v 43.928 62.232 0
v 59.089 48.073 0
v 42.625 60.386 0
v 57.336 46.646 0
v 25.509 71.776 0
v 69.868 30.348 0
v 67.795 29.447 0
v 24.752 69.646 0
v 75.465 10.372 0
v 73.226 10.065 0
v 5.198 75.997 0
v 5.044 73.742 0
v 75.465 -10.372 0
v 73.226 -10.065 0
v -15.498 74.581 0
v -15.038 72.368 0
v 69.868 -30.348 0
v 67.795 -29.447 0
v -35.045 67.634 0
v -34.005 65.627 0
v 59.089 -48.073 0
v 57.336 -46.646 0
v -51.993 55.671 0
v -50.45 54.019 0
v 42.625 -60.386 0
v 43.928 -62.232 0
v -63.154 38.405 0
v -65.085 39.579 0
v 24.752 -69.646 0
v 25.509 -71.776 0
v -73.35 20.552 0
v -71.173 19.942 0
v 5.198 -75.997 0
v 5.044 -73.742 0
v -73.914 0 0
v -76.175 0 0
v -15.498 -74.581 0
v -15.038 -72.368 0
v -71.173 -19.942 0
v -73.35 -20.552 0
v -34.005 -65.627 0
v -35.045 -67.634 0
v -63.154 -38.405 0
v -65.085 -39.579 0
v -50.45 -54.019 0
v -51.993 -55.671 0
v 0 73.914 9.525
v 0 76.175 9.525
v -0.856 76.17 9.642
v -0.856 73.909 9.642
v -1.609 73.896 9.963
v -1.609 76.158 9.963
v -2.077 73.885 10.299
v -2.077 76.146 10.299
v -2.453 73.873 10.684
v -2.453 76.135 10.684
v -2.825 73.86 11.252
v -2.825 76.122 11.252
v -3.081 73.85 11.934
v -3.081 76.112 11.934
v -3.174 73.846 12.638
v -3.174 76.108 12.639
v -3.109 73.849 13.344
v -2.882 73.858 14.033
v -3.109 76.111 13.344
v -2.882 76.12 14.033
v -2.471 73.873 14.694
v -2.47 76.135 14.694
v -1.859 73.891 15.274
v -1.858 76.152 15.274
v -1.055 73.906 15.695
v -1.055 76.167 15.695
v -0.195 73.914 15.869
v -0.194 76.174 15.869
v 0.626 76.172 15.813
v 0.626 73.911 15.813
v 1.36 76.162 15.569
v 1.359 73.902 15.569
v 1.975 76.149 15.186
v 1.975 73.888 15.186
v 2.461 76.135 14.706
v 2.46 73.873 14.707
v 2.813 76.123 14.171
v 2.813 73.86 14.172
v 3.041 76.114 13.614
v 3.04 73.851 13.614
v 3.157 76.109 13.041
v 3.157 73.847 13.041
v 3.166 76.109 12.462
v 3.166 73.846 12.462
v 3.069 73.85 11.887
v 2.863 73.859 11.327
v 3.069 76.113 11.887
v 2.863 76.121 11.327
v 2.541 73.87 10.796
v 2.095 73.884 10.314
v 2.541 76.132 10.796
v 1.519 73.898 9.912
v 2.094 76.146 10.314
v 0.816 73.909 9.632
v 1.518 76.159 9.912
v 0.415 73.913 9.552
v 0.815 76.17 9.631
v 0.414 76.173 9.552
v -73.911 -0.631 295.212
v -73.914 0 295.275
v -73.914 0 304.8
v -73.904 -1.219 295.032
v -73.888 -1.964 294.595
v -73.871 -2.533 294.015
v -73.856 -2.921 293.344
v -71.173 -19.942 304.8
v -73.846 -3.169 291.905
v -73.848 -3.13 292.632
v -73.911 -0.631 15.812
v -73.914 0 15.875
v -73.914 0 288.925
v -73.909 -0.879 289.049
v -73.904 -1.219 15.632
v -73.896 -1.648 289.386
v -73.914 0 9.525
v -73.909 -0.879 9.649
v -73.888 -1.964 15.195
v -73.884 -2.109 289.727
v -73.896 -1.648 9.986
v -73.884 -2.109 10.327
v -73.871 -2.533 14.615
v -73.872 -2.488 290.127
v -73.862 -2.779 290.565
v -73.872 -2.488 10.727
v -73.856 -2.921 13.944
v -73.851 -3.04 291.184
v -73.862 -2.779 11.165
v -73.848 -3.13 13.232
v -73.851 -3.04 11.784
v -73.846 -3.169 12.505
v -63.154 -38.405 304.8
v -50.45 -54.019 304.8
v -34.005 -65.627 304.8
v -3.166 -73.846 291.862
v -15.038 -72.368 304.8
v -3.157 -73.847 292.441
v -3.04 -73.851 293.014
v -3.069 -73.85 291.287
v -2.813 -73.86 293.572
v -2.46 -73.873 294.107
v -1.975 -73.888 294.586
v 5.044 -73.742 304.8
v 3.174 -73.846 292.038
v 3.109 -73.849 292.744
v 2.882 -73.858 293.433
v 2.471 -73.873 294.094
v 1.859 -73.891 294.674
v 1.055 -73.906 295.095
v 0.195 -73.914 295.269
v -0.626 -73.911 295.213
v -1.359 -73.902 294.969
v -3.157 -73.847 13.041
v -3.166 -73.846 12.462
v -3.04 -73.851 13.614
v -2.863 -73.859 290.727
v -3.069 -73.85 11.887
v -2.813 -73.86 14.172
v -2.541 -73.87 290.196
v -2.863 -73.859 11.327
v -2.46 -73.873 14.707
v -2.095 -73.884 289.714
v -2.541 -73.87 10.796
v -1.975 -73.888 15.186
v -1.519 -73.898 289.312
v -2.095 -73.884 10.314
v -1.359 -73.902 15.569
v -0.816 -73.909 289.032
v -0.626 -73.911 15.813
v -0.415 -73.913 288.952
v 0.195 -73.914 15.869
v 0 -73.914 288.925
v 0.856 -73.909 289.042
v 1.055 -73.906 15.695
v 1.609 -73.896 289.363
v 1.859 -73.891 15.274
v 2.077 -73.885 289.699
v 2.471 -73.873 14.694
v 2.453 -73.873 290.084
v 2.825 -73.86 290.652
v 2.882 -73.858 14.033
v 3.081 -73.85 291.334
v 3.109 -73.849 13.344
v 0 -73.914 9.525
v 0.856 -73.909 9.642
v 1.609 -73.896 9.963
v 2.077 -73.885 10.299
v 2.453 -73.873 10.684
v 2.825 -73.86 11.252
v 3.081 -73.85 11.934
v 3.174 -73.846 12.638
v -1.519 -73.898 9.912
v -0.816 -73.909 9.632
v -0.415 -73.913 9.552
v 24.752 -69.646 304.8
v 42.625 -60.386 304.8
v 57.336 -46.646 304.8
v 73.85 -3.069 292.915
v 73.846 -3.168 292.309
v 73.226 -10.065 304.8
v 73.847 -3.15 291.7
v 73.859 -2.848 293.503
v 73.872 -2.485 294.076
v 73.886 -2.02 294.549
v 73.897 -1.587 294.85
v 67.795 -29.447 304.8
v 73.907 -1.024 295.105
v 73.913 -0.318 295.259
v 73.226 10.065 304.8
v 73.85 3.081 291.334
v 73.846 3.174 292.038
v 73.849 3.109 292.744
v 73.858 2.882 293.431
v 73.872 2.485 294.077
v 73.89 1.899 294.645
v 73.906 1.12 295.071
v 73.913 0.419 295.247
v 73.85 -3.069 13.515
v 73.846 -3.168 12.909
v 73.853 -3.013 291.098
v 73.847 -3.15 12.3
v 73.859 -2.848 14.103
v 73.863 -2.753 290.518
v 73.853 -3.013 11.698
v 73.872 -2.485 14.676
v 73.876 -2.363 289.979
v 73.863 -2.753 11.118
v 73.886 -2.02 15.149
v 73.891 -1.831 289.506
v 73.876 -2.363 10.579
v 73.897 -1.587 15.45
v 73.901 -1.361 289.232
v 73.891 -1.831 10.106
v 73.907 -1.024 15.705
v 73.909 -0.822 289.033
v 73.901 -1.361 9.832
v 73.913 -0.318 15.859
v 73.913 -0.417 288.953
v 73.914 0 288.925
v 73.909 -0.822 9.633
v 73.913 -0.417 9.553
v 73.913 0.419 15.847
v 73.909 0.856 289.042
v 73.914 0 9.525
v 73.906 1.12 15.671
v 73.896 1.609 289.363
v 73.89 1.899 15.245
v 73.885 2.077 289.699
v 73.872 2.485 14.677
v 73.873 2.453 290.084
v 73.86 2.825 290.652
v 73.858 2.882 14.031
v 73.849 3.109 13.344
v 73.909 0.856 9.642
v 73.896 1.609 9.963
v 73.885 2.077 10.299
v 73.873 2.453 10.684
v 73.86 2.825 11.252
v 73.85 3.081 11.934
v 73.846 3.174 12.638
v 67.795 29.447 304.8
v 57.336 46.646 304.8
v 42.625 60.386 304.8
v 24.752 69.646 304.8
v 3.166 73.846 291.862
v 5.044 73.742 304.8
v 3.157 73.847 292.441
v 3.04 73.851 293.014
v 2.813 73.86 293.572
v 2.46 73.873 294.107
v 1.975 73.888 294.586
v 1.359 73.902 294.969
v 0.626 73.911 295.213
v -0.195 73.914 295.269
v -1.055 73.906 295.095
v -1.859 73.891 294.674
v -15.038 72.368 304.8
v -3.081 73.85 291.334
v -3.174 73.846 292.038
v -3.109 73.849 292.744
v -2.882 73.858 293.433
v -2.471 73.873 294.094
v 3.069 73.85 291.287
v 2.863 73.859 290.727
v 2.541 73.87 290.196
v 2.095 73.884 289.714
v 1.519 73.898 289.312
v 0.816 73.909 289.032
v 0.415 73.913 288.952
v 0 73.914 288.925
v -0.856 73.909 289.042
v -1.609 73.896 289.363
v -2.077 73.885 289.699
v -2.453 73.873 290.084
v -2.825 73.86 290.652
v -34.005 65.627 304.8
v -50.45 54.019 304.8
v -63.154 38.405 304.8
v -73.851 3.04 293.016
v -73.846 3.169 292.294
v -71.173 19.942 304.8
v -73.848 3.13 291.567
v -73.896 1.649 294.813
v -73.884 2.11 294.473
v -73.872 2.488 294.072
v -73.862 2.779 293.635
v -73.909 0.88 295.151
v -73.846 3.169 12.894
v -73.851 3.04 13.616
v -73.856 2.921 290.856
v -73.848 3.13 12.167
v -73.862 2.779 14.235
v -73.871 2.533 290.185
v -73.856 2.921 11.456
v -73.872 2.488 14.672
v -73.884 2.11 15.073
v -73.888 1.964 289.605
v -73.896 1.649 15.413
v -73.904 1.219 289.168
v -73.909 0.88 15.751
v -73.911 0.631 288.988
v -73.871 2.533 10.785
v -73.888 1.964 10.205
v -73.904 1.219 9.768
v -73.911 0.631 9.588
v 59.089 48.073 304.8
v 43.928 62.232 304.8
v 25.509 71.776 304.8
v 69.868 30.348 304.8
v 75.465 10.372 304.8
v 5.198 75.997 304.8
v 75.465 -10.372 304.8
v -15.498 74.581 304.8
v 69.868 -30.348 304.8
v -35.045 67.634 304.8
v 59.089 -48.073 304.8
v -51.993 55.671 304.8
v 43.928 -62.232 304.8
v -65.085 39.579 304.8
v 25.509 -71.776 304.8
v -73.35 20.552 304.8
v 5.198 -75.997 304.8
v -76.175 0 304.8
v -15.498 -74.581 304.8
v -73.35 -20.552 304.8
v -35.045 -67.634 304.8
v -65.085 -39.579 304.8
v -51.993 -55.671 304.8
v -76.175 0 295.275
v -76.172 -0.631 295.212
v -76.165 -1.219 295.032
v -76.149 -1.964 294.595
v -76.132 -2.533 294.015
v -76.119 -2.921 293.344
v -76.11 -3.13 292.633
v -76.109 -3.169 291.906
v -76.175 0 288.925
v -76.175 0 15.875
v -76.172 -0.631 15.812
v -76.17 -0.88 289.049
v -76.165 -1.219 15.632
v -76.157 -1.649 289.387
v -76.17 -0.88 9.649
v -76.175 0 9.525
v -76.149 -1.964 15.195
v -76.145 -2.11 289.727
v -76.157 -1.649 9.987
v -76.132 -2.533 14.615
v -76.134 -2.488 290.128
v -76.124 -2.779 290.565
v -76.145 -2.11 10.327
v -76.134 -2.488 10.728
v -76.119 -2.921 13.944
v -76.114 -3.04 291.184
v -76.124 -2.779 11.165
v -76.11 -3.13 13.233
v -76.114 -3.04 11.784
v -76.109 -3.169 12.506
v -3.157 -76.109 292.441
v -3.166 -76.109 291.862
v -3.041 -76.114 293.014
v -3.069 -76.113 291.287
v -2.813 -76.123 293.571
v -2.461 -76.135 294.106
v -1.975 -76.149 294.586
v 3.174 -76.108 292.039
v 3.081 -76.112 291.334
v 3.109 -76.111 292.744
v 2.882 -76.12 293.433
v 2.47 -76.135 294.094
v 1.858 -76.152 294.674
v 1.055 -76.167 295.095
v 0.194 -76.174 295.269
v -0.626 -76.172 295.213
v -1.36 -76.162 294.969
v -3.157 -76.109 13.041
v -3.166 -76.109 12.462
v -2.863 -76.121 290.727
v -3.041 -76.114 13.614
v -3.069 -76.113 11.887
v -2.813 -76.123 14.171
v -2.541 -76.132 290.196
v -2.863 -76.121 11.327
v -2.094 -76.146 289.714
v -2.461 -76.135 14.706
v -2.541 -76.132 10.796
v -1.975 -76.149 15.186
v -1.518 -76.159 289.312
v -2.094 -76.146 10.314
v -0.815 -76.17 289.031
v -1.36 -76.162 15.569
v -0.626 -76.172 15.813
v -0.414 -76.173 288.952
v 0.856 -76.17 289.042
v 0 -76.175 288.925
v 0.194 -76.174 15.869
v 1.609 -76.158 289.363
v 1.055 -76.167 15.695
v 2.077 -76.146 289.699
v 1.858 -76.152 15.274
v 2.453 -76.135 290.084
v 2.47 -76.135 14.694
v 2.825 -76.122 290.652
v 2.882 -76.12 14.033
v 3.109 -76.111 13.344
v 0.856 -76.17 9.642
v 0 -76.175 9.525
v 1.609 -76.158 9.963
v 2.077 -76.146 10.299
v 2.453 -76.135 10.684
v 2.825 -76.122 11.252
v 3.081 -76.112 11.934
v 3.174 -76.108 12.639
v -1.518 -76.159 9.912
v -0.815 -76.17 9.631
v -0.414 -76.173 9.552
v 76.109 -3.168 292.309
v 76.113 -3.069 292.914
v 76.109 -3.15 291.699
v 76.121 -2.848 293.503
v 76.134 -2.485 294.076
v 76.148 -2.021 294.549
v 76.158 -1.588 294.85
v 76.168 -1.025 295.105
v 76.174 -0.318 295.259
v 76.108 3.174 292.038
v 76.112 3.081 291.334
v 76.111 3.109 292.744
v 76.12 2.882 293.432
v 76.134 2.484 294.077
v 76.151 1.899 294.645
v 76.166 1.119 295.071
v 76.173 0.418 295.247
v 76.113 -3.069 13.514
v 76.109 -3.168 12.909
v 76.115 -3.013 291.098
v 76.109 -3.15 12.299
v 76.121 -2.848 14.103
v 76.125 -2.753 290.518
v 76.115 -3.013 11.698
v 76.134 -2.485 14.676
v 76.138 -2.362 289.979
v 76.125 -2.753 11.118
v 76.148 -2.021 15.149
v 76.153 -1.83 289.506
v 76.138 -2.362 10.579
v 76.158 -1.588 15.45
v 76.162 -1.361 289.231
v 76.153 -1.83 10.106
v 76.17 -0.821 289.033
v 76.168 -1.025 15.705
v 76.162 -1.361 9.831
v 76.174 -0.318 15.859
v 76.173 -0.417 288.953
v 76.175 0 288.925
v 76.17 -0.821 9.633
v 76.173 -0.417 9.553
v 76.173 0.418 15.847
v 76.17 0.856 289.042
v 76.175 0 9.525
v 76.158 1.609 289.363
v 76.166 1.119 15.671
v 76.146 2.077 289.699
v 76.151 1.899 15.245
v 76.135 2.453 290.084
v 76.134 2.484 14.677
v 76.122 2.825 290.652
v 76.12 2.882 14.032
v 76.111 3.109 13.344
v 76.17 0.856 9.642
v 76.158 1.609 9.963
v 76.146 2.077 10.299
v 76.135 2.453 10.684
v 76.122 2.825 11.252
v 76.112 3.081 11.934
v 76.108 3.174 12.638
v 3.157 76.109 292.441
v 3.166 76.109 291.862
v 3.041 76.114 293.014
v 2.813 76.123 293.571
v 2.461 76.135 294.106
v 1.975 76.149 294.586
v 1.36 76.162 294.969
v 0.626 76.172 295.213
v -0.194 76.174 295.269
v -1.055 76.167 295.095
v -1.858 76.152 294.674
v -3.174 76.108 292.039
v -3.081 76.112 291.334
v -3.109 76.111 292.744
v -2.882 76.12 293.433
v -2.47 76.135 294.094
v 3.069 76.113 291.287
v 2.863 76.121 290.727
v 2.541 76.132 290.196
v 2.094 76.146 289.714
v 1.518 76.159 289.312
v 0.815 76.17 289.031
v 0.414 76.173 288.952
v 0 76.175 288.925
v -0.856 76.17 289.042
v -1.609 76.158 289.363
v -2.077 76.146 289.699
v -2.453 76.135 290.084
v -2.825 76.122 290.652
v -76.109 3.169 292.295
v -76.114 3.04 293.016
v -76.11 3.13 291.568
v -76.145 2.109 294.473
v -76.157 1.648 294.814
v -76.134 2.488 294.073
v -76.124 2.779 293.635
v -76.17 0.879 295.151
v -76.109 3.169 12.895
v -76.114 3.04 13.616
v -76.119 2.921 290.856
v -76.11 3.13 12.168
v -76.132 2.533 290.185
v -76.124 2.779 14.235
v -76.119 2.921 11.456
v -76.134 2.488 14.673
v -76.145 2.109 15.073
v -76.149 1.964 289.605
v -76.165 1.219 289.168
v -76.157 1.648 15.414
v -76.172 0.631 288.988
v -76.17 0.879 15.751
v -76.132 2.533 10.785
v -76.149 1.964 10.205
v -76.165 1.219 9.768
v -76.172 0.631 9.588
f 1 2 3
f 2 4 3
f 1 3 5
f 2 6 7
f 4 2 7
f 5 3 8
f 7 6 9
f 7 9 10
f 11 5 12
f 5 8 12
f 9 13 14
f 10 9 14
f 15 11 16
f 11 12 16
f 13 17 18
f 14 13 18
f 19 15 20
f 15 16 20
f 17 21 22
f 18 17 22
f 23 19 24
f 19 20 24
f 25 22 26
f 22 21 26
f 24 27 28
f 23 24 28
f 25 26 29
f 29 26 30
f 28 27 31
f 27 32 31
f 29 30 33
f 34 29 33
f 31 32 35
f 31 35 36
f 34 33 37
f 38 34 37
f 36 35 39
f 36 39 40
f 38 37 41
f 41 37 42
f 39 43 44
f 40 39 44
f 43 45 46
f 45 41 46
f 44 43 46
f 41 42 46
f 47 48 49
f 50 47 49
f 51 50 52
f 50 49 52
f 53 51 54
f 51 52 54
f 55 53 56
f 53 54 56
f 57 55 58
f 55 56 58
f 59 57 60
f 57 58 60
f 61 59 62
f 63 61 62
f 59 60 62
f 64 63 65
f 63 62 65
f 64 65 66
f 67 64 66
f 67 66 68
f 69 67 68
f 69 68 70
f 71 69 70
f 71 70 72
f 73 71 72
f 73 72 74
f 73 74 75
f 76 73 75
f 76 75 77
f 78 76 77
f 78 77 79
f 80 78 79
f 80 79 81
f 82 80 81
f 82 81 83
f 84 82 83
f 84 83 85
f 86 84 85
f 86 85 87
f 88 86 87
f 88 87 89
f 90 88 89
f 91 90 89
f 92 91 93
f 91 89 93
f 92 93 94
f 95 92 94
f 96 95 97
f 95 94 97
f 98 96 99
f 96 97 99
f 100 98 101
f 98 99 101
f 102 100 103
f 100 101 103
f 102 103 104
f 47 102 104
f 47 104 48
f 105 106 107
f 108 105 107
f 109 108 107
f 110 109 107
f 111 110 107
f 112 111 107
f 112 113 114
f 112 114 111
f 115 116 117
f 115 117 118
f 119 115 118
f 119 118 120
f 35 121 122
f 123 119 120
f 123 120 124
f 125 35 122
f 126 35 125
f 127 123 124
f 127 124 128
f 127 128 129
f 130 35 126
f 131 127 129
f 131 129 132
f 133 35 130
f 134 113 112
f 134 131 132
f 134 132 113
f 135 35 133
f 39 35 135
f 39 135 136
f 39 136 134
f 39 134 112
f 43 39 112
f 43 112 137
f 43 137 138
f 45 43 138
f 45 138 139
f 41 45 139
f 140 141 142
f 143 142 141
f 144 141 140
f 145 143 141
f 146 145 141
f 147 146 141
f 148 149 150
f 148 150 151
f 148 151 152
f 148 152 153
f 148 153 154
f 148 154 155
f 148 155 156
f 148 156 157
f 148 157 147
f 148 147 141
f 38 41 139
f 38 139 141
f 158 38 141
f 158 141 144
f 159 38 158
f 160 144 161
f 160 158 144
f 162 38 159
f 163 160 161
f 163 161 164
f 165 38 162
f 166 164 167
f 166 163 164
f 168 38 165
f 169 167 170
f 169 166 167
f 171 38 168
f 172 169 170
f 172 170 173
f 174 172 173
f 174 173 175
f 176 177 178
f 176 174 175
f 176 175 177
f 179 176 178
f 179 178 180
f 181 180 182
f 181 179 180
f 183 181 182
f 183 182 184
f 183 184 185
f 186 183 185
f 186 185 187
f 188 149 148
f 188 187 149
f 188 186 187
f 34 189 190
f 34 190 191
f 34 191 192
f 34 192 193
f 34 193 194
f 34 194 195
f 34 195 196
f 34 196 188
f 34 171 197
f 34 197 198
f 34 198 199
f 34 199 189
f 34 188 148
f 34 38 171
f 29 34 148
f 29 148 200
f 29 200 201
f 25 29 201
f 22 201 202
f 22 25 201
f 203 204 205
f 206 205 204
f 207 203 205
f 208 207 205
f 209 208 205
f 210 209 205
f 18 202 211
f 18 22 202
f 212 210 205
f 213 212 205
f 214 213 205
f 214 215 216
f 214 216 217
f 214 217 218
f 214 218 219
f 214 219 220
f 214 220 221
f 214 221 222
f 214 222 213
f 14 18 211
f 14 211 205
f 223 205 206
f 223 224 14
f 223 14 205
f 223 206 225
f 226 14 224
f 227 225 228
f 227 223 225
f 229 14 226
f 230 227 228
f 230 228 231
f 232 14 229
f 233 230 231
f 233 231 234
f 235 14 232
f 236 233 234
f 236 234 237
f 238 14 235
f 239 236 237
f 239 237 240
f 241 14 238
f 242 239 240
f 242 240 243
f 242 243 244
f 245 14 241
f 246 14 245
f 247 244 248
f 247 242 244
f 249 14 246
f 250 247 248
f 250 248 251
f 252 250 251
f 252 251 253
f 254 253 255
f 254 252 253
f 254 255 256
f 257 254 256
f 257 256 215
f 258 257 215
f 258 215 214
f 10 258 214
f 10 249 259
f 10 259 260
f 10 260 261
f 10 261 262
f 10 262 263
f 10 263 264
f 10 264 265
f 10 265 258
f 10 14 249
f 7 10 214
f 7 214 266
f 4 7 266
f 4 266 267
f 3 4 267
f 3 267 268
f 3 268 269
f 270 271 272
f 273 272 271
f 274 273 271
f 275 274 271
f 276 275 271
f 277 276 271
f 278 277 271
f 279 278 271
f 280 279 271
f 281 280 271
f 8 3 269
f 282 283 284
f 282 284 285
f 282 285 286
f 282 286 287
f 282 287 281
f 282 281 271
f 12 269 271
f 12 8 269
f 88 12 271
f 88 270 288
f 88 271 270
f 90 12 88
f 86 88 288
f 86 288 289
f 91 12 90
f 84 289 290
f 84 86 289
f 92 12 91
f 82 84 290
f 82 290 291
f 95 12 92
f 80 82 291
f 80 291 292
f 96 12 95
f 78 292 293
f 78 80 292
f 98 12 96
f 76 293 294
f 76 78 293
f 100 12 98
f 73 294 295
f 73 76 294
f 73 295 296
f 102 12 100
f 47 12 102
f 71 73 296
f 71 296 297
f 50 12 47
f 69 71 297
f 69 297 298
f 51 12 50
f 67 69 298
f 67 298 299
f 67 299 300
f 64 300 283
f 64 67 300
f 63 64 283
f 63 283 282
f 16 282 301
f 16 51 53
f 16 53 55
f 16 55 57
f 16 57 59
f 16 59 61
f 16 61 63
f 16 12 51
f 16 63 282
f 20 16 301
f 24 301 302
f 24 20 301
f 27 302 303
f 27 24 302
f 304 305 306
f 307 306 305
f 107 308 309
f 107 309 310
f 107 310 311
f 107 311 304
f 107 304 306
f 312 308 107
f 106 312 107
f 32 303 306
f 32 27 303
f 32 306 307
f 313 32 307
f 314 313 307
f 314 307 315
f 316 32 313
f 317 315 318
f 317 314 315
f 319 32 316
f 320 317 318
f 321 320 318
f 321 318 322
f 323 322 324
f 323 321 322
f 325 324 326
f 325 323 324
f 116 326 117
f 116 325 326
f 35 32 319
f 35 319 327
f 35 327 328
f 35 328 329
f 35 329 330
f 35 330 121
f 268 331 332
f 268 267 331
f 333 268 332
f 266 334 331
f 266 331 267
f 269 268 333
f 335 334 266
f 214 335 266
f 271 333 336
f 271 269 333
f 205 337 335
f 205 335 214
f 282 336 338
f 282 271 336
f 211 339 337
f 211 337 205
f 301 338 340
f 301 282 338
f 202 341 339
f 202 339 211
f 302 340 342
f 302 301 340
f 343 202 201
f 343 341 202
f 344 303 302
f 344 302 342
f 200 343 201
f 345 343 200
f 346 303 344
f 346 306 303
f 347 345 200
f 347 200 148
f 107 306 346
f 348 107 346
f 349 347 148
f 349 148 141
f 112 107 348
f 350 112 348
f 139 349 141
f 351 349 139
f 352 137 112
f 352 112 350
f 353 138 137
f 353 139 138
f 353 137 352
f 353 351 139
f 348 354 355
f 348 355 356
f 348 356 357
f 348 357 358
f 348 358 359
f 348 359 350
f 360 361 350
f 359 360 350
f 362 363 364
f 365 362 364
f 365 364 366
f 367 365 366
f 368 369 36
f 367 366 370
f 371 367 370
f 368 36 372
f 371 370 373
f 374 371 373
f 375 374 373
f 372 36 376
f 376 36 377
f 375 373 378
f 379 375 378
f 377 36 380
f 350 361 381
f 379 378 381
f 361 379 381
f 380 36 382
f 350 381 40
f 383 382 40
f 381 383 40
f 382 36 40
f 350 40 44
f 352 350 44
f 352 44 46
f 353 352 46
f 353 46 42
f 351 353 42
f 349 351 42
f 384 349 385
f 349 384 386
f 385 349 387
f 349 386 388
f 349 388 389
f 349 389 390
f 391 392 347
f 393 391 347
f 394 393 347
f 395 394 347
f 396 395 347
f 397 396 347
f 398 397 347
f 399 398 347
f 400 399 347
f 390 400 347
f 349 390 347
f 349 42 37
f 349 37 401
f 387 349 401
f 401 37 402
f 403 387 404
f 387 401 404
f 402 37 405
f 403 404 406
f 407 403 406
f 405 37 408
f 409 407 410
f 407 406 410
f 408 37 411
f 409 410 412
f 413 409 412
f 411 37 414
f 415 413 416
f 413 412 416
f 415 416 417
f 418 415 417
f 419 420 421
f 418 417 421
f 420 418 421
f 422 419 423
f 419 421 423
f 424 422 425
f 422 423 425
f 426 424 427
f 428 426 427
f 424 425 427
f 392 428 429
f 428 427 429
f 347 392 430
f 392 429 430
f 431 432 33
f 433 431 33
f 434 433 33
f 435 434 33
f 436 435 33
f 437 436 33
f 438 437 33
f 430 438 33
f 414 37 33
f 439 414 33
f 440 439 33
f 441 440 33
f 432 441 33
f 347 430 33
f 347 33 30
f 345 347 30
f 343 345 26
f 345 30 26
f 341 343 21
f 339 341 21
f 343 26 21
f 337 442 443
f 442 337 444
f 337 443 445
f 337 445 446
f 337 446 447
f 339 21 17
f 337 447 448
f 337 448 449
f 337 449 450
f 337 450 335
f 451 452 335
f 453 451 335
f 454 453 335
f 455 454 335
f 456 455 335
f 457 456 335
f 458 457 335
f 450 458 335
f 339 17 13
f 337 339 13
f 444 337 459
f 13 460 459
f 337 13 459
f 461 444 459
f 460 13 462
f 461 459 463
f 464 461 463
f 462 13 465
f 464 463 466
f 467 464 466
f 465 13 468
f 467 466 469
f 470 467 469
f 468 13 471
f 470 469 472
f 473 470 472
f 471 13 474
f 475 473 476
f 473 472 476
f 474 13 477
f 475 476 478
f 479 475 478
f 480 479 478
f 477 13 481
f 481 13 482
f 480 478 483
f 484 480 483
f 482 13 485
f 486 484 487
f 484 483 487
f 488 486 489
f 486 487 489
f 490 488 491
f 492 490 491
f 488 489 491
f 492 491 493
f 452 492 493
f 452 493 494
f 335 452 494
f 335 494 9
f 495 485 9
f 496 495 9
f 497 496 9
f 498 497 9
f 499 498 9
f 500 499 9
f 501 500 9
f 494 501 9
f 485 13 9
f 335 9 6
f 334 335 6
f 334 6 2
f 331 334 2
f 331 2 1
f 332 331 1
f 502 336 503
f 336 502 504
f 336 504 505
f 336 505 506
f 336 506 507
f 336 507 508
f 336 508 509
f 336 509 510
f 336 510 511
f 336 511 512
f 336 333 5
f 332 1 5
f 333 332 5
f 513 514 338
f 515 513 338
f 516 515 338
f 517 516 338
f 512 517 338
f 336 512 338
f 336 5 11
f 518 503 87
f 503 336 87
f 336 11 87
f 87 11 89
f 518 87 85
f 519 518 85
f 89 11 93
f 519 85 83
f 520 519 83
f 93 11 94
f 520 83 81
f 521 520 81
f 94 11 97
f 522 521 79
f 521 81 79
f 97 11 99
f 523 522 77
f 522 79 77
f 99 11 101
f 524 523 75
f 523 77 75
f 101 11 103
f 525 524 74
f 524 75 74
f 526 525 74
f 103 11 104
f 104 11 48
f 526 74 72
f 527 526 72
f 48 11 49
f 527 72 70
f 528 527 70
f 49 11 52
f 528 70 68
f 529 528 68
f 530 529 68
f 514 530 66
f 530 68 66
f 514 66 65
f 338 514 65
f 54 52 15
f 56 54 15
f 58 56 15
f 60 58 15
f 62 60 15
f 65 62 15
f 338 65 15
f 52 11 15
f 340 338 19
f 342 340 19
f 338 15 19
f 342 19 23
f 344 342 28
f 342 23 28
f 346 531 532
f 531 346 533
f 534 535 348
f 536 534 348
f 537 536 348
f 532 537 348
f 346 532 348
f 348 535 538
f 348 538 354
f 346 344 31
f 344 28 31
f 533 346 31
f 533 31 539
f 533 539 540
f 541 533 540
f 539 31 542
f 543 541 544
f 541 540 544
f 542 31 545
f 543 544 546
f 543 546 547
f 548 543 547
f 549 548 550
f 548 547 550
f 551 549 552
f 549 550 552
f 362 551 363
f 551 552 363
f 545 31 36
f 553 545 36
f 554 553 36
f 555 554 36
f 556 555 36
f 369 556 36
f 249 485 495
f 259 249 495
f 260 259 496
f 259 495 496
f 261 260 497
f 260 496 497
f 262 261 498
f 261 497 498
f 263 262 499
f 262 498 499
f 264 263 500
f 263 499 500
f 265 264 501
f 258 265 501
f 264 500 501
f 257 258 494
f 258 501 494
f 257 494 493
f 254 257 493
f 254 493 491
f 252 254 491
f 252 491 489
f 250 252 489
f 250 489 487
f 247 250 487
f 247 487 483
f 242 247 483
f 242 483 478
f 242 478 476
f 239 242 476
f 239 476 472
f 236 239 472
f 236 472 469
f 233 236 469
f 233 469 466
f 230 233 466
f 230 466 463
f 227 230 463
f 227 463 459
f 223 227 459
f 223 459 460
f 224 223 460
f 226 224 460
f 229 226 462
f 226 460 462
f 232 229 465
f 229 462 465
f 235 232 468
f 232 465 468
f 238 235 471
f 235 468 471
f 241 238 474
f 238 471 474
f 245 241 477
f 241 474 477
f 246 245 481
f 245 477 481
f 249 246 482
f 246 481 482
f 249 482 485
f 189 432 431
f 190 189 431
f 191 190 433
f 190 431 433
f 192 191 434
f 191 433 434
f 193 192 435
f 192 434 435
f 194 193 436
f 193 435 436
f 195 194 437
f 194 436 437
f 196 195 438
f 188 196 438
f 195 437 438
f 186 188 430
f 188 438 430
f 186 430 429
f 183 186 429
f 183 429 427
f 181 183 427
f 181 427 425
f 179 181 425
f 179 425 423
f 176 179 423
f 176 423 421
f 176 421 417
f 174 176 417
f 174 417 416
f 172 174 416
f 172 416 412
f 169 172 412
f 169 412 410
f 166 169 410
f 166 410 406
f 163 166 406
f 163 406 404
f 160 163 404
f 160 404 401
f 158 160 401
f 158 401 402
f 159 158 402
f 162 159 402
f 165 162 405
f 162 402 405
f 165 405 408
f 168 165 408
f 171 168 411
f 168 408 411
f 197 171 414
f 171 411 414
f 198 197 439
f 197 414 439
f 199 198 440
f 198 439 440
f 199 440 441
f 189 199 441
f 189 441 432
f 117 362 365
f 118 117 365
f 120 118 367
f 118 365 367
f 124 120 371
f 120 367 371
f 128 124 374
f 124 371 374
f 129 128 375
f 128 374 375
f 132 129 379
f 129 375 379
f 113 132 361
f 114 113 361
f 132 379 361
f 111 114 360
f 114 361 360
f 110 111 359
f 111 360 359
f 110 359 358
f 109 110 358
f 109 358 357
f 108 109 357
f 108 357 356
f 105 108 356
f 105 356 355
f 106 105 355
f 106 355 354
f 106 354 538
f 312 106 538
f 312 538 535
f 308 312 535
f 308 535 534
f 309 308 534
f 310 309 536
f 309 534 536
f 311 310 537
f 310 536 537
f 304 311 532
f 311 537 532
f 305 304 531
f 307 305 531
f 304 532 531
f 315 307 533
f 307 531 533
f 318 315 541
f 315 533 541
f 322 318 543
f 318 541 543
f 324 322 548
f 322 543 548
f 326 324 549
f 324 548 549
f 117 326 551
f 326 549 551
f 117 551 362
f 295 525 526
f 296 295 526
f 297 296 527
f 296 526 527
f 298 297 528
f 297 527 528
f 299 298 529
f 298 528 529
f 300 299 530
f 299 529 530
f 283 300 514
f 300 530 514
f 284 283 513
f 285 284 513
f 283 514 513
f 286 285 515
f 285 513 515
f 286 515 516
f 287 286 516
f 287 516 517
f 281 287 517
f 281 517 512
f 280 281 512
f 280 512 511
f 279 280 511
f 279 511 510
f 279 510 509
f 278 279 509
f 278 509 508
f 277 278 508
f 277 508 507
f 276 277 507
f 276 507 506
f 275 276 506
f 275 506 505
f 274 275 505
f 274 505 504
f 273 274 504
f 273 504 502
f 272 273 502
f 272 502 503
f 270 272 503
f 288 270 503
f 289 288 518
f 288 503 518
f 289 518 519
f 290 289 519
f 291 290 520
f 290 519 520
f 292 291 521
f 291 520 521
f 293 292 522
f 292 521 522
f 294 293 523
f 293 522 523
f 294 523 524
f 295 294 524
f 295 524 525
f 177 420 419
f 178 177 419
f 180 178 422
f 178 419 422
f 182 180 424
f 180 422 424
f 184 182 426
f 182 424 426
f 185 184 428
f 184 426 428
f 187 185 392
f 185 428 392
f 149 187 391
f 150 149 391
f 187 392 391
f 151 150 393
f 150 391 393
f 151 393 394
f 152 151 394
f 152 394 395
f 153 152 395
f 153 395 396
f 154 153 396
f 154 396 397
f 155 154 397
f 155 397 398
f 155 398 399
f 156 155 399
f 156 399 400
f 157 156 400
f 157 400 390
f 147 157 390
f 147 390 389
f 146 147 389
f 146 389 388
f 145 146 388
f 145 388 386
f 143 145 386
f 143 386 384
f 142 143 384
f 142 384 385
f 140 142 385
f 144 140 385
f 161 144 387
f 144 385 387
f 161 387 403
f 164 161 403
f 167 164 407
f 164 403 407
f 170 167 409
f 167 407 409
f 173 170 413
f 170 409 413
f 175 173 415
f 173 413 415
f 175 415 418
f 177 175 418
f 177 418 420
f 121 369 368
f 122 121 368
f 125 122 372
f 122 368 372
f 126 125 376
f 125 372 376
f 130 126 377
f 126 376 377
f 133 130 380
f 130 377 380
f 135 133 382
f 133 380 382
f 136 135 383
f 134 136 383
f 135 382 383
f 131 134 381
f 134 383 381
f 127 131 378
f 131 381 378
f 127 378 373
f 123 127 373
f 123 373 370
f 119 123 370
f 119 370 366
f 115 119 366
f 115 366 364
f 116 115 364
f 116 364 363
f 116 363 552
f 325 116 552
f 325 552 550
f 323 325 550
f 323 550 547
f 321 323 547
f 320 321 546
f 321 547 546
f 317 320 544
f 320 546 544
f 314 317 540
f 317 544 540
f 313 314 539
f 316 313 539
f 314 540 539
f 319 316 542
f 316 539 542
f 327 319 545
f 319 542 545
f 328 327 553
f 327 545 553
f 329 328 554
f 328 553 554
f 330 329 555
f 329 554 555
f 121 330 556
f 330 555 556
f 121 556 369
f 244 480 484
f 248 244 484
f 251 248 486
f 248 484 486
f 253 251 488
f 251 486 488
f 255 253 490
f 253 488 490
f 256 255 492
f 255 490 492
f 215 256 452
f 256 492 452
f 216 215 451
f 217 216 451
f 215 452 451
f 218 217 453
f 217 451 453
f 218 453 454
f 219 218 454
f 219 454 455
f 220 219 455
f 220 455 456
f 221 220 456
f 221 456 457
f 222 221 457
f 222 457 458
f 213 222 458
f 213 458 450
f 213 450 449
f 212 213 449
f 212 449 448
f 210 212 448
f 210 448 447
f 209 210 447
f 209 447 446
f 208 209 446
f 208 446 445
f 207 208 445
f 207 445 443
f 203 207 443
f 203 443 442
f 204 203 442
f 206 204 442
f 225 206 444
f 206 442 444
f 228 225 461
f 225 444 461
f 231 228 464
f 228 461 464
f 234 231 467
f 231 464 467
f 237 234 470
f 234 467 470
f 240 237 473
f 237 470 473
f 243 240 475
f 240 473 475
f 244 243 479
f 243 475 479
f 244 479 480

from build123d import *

# Parameters (mm, degrees)
SKETCH1_R           = 76.1746
SKETCH1_R_2         = 73.914
BOSS_EXTRUDE1_DEPTH = 304.8
SKETCH2_R           = 3.175
CUT_EXTRUDE1_DEPTH  = 25.4
CIRPATTERN1_COUNT   = 4


with BuildPart() as part:
    # Sketch1 → Boss-Extrude1 (new body)
    with BuildSketch(Plane.XY):
        with Locations(Location((0, 0, 0), (0, 0, 180))):
            Circle(SKETCH1_R)
        with Locations(Location((0, 0, 0), (0, 0, 180))):
            Circle(SKETCH1_R_2, mode=Mode.SUBTRACT)
    extrude(amount=BOSS_EXTRUDE1_DEPTH)

    # Sketch2 → Cut-Extrude1 (cut)
    with BuildSketch(Plane(origin=(76.2, 0, 0), x_dir=(0, 0, -1), z_dir=(1, 0, 0))):
        with Locations((-292.1, 0)):
            Circle(SKETCH2_R)
        with Locations((-12.7, 0)):
            Circle(SKETCH2_R)
    cut_extrude1 = extrude(amount=-CUT_EXTRUDE1_DEPTH, mode=Mode.SUBTRACT)

    # CirPattern1: Cut-Extrude1 ×4 about axis
    cirpattern1_axis = Axis((0, 0, 304.8), (0, 0, -1))
    for i in range(1, CIRPATTERN1_COUNT):
        add(cut_extrude1.rotate(cirpattern1_axis, i * 360 / CIRPATTERN1_COUNT), mode=Mode.SUBTRACT)


solid = part.part
